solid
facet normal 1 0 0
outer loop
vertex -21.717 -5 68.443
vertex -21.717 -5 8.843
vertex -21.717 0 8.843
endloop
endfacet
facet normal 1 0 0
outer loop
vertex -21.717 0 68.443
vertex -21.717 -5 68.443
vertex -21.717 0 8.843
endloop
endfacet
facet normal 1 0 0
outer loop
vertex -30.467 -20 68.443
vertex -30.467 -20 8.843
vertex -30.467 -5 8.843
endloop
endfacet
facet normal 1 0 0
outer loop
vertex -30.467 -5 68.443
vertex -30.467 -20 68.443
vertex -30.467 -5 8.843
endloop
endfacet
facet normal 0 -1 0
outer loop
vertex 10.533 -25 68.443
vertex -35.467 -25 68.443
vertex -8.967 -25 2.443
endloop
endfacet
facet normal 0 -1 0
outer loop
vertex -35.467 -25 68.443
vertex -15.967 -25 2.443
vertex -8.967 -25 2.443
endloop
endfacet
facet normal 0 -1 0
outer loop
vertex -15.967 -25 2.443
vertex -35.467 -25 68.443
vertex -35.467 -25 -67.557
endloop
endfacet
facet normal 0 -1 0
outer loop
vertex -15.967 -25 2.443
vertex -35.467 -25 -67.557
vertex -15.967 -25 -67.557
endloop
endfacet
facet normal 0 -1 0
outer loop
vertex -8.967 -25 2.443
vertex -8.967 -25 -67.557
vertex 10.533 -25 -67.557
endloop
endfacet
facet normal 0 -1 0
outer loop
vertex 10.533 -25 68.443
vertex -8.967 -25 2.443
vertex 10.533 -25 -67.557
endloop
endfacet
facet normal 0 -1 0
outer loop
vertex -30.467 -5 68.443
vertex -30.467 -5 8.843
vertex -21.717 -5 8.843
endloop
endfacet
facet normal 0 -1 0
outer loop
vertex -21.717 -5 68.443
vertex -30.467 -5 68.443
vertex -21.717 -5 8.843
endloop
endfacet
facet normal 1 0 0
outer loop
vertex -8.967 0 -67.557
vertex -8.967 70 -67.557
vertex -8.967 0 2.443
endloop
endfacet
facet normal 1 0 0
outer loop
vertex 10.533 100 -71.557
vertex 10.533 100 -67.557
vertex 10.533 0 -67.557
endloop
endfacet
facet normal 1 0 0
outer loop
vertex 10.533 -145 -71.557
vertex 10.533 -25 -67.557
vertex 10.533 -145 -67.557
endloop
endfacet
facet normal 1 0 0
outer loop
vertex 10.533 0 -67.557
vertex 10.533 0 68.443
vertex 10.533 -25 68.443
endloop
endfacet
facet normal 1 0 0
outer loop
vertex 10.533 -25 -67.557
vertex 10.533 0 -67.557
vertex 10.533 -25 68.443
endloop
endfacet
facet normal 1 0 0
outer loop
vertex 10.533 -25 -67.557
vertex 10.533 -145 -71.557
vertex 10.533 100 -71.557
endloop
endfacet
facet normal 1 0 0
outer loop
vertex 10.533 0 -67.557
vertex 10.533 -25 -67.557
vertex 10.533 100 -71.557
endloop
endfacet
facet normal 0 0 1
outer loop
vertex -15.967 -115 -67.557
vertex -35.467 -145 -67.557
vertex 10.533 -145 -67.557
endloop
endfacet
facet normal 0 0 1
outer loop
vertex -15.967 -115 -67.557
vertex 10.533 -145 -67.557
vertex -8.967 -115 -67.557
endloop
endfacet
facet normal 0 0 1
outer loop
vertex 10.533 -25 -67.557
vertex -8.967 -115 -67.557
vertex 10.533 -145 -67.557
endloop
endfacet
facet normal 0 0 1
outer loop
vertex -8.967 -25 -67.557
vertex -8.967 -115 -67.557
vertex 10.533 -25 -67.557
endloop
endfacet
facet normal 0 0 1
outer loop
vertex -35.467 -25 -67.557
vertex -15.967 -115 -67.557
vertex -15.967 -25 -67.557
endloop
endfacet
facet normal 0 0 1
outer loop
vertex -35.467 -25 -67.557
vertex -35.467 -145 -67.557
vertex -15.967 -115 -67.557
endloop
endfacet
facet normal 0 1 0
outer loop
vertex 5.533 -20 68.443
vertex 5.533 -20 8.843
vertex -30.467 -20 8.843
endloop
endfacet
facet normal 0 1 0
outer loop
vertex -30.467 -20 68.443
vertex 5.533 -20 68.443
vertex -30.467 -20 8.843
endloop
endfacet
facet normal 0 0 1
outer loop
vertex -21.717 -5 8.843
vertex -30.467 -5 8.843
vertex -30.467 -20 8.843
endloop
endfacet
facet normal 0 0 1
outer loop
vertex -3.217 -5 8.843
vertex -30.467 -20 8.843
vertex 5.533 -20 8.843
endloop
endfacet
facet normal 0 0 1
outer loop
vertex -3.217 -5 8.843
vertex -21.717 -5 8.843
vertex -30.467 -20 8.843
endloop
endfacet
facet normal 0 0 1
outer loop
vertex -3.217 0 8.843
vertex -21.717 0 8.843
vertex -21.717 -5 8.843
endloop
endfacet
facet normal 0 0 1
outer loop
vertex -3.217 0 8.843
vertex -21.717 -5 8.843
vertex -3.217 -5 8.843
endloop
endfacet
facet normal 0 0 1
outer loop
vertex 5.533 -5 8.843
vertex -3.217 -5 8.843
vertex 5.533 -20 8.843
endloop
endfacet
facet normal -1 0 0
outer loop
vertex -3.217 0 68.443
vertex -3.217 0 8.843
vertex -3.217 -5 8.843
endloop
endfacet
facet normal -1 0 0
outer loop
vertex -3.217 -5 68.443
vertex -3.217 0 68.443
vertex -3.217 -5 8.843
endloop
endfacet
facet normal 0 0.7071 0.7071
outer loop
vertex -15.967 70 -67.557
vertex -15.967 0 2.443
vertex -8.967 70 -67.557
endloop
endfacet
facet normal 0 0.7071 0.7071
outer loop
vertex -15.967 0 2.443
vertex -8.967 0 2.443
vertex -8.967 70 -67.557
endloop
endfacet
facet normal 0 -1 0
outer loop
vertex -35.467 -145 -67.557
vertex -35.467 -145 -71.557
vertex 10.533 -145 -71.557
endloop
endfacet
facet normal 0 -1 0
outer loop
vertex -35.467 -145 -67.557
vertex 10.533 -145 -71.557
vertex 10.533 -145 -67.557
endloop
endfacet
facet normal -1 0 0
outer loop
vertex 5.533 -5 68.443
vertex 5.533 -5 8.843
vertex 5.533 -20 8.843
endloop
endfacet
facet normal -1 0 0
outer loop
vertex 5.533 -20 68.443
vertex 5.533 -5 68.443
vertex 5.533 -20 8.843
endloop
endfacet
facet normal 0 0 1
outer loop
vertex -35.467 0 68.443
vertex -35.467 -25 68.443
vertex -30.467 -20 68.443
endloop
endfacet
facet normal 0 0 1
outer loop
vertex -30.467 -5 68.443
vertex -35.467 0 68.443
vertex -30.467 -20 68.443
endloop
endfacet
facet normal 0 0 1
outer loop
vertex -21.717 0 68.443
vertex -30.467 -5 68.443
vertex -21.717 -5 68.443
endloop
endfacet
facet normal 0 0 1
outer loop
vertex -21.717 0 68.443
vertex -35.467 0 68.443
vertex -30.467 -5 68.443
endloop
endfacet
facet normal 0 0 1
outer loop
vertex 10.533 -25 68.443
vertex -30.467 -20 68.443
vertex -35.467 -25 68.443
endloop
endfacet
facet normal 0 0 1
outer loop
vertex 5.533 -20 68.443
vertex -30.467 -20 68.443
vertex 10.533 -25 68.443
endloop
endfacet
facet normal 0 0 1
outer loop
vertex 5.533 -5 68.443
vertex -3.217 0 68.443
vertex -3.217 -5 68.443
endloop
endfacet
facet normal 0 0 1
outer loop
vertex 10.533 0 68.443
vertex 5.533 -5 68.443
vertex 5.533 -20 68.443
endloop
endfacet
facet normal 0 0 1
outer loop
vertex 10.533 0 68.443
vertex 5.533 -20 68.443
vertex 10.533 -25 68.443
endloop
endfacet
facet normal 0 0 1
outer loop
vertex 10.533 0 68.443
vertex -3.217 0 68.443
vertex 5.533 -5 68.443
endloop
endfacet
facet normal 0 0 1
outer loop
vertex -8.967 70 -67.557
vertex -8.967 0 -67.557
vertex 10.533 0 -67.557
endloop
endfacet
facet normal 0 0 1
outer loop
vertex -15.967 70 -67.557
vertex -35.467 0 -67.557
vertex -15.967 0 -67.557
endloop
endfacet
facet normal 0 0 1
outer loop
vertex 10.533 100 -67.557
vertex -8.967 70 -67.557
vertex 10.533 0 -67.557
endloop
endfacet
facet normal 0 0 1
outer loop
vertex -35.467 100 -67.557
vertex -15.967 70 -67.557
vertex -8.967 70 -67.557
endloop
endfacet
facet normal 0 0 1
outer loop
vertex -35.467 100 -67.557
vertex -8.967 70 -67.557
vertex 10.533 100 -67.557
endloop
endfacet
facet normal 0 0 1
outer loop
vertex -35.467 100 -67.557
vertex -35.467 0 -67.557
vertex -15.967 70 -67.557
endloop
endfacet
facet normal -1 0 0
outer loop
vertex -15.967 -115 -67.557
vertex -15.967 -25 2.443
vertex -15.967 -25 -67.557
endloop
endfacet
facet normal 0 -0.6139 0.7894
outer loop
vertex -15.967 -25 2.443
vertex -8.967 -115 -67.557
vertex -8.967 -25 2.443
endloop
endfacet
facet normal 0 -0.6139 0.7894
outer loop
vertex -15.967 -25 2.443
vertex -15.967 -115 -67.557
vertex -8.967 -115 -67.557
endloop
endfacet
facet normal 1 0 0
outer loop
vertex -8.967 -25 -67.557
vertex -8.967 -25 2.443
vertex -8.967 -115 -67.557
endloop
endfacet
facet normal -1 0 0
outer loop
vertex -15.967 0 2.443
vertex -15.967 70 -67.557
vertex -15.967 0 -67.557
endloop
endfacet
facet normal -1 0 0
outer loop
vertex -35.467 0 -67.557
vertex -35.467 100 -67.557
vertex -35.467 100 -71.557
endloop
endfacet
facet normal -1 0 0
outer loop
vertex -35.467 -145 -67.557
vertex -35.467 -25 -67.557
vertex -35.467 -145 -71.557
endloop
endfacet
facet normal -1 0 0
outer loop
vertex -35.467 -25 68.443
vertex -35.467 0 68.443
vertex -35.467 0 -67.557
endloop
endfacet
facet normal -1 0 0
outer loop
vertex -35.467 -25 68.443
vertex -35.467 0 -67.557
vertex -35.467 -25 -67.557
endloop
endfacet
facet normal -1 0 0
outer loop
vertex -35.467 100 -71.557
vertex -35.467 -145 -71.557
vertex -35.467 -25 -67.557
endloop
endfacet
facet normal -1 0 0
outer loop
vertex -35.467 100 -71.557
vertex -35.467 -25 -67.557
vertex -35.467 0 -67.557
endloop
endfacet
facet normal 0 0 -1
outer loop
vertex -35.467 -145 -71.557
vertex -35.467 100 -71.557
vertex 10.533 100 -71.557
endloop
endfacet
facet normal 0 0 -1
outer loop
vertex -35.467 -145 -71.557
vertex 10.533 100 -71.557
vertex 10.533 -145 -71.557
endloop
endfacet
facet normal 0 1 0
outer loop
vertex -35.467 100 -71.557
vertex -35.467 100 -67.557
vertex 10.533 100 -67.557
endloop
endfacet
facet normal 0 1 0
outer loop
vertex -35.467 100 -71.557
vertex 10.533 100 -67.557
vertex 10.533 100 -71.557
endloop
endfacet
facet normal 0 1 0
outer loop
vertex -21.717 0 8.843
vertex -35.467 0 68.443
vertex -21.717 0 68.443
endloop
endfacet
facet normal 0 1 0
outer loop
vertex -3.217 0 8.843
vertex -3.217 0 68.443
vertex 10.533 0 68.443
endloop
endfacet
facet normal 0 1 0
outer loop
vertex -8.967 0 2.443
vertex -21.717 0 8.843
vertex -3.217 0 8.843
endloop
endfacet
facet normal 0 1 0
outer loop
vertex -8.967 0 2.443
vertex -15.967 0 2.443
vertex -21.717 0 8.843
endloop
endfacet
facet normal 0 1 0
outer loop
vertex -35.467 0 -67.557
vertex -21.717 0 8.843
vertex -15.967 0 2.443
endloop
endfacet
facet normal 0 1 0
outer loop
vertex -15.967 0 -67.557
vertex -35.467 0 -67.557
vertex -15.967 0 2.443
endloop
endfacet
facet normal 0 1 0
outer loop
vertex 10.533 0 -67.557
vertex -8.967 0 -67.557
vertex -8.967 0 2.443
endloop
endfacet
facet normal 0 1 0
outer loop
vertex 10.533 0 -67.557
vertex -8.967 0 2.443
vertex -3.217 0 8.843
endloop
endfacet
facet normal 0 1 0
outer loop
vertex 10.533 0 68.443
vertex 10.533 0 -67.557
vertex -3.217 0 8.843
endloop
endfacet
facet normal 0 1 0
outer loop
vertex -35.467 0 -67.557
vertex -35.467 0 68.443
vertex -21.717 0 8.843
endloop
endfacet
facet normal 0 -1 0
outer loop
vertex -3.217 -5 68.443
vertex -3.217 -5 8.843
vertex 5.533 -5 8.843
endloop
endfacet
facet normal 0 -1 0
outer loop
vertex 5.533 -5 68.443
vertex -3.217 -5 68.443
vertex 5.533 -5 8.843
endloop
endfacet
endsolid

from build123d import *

# Parameters (mm, degrees)
F0_W      = 46
F0_H      = 80
F1_DEPTH  = 25
F4_DEPTH  = 60
F5_DEPTH  = 46
F8_DEPTH  = 3.5
F10_DEPTH = 0.4


with BuildPart() as f1:
    # F0 (on Front) → F1 (new body)
    with BuildSketch(Plane.XZ):
        with Locations((-12.4670048244, -31.5567021806)):
            Rectangle(F0_W, F0_H)
    extrude(amount=F1_DEPTH)

    # F3 (on face) → F4 (join)
    with BuildSketch(Plane.XY.offset(8.4432978194)):
        Polygon((10.5329951756, -25), (10.5329951756, 0), (-3.2170048244, 0), (-3.2170048244, -5), (5.5329951756, -5), (5.5329951756, -20), (-30.4670048244, -20), (-30.4670048244, -5), (-21.7170048244, -5), (-21.7170048244, 0), (-35.4670048244, 0), (-35.4670048244, -25), align=None)
    extrude(amount=F4_DEPTH)

    # F2 (on face) → F5 (join)
    with BuildSketch(Plane(origin=(-35.4670048244, 0, 0), x_dir=(0, -1, 0), z_dir=(-1, 0, 0))):
        Polygon((-100, -71.5567021806), (0, -71.5567021806), (0, -67.5567021806), (-70, -67.5567021806), (-100, -67.5567021806), align=None)
        Polygon((25, -67.5567021806), (25, -71.5567021806), (145, -71.5567021806), (145, -67.5567021806), (115, -67.5567021806), align=None)
    extrude(amount=-F5_DEPTH)

    # F7 (on offset) → F8 (join, symmetric)
    with BuildSketch(Plane(origin=(-12.4670048244, 0, 0), x_dir=(0, -1, 0), z_dir=(-1, 0, 0))):
        Polygon((0, -67.5567021806), (0, 2.4432978194), (-70, -67.5567021806), align=None)
        Polygon((25, 2.4432978194), (25, -67.5567021806), (115, -67.5567021806), align=None)
    extrude(amount=F8_DEPTH, both=True)

    # F10 (add, through all): a face of the model
    f10_faces = [f1.faces().sort_by_distance(p)[0] for p in [
        (-12.4670048244, -11.0375494071, 8.4432978194),
    ]]
    extrude(f10_faces, amount=F10_DEPTH)


solid = f1.part
